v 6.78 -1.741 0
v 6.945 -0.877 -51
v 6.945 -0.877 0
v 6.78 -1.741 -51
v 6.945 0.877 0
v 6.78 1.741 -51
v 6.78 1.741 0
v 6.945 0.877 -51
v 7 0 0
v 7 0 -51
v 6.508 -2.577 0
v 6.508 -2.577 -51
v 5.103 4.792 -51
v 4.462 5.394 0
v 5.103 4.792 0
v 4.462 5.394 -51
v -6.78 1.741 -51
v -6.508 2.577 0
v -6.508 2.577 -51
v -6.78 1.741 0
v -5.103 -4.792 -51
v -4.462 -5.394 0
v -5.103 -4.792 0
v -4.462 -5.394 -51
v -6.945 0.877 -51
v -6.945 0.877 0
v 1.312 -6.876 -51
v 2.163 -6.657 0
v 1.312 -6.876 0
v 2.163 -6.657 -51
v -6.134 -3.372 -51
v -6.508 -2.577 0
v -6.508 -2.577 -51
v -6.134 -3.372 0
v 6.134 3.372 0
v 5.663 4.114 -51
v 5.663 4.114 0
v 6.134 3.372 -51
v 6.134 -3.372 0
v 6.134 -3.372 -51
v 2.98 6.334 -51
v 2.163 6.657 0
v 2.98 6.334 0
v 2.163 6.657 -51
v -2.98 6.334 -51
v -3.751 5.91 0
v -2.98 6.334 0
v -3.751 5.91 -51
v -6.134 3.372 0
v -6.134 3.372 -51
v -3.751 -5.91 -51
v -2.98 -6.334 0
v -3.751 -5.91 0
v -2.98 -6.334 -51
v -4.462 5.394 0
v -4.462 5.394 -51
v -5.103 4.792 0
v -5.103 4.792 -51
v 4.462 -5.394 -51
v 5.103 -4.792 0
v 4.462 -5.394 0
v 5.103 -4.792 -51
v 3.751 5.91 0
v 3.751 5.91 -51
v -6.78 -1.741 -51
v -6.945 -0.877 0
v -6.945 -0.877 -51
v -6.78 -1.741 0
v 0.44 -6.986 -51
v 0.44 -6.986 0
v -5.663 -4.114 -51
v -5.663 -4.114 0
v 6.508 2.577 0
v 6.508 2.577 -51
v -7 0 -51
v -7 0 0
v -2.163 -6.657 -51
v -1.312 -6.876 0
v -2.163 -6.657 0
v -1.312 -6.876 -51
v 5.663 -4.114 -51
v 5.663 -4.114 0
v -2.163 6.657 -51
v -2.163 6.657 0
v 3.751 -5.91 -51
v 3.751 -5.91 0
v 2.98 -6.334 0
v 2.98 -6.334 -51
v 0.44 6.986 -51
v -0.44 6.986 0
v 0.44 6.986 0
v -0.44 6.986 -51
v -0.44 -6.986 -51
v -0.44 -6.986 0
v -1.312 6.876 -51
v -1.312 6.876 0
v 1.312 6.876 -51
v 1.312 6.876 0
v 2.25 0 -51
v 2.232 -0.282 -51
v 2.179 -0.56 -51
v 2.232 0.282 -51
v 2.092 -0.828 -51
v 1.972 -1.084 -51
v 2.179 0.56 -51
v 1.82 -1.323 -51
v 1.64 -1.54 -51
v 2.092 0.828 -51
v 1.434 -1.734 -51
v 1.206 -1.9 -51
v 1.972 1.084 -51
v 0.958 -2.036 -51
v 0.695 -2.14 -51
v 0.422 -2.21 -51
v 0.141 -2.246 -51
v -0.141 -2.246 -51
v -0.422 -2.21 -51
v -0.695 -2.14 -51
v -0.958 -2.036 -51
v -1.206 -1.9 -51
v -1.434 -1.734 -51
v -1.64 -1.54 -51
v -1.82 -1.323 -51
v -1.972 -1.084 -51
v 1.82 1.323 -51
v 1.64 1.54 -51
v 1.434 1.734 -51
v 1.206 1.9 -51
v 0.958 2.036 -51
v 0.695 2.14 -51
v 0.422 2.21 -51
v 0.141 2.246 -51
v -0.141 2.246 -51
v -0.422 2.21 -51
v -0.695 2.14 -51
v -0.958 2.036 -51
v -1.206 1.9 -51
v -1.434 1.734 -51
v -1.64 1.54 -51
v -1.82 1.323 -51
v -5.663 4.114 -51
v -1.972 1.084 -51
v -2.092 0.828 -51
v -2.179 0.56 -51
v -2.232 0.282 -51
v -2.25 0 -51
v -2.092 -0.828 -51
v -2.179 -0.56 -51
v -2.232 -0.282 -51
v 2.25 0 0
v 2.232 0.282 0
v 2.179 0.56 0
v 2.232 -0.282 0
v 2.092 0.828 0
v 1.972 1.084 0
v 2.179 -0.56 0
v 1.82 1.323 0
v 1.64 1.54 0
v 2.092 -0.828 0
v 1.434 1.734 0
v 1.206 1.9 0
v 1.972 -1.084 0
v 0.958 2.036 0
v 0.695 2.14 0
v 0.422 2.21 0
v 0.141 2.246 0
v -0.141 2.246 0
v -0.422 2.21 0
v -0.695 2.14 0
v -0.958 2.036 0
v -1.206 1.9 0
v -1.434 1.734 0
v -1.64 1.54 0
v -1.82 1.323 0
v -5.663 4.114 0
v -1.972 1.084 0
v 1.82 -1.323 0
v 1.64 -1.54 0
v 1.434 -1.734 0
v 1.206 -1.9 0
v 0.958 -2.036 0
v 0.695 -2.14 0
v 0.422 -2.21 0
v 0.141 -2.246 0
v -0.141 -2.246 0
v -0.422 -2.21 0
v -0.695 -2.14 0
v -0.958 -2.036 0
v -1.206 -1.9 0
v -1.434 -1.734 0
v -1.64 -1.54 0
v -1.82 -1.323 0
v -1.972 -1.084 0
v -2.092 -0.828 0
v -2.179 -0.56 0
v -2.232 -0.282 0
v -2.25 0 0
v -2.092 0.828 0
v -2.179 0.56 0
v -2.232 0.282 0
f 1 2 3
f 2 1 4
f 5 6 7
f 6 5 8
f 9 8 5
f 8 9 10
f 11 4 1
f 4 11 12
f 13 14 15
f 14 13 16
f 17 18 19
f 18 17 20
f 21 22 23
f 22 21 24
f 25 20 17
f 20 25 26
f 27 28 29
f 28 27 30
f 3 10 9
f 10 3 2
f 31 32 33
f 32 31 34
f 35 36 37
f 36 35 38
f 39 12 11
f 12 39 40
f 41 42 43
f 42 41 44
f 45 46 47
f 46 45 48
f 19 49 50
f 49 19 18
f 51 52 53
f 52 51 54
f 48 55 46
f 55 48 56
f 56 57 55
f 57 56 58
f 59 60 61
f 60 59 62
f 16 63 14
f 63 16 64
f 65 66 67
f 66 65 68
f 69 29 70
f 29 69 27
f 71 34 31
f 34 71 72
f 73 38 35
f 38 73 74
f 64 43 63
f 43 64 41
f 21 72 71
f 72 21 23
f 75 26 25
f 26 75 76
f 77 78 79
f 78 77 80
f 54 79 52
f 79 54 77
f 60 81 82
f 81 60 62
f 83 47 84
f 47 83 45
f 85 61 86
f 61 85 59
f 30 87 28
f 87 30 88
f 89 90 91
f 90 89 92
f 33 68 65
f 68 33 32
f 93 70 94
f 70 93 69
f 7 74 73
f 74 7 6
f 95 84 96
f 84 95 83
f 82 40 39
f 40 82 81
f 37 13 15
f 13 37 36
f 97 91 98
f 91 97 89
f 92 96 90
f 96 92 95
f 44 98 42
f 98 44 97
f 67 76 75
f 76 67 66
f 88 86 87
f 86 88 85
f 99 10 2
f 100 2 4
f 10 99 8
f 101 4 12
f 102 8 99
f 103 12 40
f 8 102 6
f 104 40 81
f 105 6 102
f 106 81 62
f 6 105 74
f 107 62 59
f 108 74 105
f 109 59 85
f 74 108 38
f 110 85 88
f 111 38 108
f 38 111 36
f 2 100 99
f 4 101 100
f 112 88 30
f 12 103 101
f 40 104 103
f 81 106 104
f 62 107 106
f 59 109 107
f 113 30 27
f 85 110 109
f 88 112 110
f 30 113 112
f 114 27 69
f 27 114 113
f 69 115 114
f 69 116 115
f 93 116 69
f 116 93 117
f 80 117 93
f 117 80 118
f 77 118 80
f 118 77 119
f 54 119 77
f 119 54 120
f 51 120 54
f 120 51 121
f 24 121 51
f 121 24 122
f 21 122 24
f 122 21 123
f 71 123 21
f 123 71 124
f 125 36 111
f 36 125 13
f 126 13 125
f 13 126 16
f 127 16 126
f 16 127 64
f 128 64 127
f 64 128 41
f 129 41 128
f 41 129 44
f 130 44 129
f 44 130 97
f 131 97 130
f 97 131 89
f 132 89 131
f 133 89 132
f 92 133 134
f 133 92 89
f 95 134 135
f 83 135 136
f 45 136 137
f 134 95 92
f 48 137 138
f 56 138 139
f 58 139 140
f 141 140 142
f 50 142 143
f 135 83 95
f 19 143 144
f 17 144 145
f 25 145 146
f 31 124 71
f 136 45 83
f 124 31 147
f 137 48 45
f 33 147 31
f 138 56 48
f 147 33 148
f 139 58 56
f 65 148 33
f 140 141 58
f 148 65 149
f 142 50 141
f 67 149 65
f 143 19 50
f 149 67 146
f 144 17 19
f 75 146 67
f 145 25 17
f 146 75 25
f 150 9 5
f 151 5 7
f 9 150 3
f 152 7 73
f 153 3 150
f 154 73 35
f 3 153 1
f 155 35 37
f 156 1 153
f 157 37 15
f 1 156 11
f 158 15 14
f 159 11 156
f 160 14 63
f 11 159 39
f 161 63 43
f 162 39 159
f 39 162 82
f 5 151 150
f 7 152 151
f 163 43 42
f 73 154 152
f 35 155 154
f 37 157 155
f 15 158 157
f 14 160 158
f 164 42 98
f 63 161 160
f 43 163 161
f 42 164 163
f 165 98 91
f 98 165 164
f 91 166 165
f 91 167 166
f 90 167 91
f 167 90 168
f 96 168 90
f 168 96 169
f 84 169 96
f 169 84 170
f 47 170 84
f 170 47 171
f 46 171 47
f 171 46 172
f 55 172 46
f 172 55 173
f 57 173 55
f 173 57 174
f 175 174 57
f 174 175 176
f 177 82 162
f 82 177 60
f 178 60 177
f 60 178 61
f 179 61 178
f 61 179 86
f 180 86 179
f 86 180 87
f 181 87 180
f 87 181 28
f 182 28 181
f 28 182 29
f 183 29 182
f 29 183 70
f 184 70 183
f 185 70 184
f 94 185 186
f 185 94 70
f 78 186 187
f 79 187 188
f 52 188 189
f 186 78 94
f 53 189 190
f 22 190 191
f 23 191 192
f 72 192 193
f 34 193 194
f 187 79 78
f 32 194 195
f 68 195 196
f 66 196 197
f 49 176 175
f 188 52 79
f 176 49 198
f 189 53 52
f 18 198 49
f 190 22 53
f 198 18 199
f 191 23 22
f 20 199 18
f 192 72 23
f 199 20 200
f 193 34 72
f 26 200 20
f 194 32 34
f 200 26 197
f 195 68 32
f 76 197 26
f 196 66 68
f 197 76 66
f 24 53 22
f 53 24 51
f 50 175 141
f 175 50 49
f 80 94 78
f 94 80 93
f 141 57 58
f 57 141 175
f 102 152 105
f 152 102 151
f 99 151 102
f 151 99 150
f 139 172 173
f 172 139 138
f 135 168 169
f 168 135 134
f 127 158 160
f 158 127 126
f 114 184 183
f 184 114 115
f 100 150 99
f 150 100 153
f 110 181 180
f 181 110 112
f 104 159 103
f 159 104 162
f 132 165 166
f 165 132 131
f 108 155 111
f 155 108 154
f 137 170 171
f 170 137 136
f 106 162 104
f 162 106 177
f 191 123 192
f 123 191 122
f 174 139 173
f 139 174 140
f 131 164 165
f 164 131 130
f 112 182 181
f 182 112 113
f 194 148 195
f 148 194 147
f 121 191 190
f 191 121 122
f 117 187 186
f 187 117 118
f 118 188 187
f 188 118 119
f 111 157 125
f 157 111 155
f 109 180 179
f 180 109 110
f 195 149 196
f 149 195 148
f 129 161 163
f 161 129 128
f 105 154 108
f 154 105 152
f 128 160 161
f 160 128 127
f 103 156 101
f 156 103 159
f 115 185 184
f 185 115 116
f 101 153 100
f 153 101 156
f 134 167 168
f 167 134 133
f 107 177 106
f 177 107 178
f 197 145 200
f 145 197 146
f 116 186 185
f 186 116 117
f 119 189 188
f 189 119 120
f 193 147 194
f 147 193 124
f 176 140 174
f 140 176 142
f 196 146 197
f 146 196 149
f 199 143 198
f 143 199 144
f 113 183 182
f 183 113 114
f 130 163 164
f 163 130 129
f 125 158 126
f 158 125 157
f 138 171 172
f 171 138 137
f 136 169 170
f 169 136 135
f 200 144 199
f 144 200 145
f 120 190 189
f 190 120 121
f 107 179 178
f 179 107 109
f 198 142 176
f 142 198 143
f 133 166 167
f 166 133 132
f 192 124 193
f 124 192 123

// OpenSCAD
$fn = 50;


difference() {
	union() {
		translate(v = [0, 0, -51.0000000000]) {
			cylinder(h = 51, r = 7.0000000000);
		}
		cylinder(h = 0, r = 16.0000000000);
	}
	union() {
		#translate(v = [0, 0, -51]) {
			cylinder(h = 51, r = 2.2500000000);
		}
	}
}
